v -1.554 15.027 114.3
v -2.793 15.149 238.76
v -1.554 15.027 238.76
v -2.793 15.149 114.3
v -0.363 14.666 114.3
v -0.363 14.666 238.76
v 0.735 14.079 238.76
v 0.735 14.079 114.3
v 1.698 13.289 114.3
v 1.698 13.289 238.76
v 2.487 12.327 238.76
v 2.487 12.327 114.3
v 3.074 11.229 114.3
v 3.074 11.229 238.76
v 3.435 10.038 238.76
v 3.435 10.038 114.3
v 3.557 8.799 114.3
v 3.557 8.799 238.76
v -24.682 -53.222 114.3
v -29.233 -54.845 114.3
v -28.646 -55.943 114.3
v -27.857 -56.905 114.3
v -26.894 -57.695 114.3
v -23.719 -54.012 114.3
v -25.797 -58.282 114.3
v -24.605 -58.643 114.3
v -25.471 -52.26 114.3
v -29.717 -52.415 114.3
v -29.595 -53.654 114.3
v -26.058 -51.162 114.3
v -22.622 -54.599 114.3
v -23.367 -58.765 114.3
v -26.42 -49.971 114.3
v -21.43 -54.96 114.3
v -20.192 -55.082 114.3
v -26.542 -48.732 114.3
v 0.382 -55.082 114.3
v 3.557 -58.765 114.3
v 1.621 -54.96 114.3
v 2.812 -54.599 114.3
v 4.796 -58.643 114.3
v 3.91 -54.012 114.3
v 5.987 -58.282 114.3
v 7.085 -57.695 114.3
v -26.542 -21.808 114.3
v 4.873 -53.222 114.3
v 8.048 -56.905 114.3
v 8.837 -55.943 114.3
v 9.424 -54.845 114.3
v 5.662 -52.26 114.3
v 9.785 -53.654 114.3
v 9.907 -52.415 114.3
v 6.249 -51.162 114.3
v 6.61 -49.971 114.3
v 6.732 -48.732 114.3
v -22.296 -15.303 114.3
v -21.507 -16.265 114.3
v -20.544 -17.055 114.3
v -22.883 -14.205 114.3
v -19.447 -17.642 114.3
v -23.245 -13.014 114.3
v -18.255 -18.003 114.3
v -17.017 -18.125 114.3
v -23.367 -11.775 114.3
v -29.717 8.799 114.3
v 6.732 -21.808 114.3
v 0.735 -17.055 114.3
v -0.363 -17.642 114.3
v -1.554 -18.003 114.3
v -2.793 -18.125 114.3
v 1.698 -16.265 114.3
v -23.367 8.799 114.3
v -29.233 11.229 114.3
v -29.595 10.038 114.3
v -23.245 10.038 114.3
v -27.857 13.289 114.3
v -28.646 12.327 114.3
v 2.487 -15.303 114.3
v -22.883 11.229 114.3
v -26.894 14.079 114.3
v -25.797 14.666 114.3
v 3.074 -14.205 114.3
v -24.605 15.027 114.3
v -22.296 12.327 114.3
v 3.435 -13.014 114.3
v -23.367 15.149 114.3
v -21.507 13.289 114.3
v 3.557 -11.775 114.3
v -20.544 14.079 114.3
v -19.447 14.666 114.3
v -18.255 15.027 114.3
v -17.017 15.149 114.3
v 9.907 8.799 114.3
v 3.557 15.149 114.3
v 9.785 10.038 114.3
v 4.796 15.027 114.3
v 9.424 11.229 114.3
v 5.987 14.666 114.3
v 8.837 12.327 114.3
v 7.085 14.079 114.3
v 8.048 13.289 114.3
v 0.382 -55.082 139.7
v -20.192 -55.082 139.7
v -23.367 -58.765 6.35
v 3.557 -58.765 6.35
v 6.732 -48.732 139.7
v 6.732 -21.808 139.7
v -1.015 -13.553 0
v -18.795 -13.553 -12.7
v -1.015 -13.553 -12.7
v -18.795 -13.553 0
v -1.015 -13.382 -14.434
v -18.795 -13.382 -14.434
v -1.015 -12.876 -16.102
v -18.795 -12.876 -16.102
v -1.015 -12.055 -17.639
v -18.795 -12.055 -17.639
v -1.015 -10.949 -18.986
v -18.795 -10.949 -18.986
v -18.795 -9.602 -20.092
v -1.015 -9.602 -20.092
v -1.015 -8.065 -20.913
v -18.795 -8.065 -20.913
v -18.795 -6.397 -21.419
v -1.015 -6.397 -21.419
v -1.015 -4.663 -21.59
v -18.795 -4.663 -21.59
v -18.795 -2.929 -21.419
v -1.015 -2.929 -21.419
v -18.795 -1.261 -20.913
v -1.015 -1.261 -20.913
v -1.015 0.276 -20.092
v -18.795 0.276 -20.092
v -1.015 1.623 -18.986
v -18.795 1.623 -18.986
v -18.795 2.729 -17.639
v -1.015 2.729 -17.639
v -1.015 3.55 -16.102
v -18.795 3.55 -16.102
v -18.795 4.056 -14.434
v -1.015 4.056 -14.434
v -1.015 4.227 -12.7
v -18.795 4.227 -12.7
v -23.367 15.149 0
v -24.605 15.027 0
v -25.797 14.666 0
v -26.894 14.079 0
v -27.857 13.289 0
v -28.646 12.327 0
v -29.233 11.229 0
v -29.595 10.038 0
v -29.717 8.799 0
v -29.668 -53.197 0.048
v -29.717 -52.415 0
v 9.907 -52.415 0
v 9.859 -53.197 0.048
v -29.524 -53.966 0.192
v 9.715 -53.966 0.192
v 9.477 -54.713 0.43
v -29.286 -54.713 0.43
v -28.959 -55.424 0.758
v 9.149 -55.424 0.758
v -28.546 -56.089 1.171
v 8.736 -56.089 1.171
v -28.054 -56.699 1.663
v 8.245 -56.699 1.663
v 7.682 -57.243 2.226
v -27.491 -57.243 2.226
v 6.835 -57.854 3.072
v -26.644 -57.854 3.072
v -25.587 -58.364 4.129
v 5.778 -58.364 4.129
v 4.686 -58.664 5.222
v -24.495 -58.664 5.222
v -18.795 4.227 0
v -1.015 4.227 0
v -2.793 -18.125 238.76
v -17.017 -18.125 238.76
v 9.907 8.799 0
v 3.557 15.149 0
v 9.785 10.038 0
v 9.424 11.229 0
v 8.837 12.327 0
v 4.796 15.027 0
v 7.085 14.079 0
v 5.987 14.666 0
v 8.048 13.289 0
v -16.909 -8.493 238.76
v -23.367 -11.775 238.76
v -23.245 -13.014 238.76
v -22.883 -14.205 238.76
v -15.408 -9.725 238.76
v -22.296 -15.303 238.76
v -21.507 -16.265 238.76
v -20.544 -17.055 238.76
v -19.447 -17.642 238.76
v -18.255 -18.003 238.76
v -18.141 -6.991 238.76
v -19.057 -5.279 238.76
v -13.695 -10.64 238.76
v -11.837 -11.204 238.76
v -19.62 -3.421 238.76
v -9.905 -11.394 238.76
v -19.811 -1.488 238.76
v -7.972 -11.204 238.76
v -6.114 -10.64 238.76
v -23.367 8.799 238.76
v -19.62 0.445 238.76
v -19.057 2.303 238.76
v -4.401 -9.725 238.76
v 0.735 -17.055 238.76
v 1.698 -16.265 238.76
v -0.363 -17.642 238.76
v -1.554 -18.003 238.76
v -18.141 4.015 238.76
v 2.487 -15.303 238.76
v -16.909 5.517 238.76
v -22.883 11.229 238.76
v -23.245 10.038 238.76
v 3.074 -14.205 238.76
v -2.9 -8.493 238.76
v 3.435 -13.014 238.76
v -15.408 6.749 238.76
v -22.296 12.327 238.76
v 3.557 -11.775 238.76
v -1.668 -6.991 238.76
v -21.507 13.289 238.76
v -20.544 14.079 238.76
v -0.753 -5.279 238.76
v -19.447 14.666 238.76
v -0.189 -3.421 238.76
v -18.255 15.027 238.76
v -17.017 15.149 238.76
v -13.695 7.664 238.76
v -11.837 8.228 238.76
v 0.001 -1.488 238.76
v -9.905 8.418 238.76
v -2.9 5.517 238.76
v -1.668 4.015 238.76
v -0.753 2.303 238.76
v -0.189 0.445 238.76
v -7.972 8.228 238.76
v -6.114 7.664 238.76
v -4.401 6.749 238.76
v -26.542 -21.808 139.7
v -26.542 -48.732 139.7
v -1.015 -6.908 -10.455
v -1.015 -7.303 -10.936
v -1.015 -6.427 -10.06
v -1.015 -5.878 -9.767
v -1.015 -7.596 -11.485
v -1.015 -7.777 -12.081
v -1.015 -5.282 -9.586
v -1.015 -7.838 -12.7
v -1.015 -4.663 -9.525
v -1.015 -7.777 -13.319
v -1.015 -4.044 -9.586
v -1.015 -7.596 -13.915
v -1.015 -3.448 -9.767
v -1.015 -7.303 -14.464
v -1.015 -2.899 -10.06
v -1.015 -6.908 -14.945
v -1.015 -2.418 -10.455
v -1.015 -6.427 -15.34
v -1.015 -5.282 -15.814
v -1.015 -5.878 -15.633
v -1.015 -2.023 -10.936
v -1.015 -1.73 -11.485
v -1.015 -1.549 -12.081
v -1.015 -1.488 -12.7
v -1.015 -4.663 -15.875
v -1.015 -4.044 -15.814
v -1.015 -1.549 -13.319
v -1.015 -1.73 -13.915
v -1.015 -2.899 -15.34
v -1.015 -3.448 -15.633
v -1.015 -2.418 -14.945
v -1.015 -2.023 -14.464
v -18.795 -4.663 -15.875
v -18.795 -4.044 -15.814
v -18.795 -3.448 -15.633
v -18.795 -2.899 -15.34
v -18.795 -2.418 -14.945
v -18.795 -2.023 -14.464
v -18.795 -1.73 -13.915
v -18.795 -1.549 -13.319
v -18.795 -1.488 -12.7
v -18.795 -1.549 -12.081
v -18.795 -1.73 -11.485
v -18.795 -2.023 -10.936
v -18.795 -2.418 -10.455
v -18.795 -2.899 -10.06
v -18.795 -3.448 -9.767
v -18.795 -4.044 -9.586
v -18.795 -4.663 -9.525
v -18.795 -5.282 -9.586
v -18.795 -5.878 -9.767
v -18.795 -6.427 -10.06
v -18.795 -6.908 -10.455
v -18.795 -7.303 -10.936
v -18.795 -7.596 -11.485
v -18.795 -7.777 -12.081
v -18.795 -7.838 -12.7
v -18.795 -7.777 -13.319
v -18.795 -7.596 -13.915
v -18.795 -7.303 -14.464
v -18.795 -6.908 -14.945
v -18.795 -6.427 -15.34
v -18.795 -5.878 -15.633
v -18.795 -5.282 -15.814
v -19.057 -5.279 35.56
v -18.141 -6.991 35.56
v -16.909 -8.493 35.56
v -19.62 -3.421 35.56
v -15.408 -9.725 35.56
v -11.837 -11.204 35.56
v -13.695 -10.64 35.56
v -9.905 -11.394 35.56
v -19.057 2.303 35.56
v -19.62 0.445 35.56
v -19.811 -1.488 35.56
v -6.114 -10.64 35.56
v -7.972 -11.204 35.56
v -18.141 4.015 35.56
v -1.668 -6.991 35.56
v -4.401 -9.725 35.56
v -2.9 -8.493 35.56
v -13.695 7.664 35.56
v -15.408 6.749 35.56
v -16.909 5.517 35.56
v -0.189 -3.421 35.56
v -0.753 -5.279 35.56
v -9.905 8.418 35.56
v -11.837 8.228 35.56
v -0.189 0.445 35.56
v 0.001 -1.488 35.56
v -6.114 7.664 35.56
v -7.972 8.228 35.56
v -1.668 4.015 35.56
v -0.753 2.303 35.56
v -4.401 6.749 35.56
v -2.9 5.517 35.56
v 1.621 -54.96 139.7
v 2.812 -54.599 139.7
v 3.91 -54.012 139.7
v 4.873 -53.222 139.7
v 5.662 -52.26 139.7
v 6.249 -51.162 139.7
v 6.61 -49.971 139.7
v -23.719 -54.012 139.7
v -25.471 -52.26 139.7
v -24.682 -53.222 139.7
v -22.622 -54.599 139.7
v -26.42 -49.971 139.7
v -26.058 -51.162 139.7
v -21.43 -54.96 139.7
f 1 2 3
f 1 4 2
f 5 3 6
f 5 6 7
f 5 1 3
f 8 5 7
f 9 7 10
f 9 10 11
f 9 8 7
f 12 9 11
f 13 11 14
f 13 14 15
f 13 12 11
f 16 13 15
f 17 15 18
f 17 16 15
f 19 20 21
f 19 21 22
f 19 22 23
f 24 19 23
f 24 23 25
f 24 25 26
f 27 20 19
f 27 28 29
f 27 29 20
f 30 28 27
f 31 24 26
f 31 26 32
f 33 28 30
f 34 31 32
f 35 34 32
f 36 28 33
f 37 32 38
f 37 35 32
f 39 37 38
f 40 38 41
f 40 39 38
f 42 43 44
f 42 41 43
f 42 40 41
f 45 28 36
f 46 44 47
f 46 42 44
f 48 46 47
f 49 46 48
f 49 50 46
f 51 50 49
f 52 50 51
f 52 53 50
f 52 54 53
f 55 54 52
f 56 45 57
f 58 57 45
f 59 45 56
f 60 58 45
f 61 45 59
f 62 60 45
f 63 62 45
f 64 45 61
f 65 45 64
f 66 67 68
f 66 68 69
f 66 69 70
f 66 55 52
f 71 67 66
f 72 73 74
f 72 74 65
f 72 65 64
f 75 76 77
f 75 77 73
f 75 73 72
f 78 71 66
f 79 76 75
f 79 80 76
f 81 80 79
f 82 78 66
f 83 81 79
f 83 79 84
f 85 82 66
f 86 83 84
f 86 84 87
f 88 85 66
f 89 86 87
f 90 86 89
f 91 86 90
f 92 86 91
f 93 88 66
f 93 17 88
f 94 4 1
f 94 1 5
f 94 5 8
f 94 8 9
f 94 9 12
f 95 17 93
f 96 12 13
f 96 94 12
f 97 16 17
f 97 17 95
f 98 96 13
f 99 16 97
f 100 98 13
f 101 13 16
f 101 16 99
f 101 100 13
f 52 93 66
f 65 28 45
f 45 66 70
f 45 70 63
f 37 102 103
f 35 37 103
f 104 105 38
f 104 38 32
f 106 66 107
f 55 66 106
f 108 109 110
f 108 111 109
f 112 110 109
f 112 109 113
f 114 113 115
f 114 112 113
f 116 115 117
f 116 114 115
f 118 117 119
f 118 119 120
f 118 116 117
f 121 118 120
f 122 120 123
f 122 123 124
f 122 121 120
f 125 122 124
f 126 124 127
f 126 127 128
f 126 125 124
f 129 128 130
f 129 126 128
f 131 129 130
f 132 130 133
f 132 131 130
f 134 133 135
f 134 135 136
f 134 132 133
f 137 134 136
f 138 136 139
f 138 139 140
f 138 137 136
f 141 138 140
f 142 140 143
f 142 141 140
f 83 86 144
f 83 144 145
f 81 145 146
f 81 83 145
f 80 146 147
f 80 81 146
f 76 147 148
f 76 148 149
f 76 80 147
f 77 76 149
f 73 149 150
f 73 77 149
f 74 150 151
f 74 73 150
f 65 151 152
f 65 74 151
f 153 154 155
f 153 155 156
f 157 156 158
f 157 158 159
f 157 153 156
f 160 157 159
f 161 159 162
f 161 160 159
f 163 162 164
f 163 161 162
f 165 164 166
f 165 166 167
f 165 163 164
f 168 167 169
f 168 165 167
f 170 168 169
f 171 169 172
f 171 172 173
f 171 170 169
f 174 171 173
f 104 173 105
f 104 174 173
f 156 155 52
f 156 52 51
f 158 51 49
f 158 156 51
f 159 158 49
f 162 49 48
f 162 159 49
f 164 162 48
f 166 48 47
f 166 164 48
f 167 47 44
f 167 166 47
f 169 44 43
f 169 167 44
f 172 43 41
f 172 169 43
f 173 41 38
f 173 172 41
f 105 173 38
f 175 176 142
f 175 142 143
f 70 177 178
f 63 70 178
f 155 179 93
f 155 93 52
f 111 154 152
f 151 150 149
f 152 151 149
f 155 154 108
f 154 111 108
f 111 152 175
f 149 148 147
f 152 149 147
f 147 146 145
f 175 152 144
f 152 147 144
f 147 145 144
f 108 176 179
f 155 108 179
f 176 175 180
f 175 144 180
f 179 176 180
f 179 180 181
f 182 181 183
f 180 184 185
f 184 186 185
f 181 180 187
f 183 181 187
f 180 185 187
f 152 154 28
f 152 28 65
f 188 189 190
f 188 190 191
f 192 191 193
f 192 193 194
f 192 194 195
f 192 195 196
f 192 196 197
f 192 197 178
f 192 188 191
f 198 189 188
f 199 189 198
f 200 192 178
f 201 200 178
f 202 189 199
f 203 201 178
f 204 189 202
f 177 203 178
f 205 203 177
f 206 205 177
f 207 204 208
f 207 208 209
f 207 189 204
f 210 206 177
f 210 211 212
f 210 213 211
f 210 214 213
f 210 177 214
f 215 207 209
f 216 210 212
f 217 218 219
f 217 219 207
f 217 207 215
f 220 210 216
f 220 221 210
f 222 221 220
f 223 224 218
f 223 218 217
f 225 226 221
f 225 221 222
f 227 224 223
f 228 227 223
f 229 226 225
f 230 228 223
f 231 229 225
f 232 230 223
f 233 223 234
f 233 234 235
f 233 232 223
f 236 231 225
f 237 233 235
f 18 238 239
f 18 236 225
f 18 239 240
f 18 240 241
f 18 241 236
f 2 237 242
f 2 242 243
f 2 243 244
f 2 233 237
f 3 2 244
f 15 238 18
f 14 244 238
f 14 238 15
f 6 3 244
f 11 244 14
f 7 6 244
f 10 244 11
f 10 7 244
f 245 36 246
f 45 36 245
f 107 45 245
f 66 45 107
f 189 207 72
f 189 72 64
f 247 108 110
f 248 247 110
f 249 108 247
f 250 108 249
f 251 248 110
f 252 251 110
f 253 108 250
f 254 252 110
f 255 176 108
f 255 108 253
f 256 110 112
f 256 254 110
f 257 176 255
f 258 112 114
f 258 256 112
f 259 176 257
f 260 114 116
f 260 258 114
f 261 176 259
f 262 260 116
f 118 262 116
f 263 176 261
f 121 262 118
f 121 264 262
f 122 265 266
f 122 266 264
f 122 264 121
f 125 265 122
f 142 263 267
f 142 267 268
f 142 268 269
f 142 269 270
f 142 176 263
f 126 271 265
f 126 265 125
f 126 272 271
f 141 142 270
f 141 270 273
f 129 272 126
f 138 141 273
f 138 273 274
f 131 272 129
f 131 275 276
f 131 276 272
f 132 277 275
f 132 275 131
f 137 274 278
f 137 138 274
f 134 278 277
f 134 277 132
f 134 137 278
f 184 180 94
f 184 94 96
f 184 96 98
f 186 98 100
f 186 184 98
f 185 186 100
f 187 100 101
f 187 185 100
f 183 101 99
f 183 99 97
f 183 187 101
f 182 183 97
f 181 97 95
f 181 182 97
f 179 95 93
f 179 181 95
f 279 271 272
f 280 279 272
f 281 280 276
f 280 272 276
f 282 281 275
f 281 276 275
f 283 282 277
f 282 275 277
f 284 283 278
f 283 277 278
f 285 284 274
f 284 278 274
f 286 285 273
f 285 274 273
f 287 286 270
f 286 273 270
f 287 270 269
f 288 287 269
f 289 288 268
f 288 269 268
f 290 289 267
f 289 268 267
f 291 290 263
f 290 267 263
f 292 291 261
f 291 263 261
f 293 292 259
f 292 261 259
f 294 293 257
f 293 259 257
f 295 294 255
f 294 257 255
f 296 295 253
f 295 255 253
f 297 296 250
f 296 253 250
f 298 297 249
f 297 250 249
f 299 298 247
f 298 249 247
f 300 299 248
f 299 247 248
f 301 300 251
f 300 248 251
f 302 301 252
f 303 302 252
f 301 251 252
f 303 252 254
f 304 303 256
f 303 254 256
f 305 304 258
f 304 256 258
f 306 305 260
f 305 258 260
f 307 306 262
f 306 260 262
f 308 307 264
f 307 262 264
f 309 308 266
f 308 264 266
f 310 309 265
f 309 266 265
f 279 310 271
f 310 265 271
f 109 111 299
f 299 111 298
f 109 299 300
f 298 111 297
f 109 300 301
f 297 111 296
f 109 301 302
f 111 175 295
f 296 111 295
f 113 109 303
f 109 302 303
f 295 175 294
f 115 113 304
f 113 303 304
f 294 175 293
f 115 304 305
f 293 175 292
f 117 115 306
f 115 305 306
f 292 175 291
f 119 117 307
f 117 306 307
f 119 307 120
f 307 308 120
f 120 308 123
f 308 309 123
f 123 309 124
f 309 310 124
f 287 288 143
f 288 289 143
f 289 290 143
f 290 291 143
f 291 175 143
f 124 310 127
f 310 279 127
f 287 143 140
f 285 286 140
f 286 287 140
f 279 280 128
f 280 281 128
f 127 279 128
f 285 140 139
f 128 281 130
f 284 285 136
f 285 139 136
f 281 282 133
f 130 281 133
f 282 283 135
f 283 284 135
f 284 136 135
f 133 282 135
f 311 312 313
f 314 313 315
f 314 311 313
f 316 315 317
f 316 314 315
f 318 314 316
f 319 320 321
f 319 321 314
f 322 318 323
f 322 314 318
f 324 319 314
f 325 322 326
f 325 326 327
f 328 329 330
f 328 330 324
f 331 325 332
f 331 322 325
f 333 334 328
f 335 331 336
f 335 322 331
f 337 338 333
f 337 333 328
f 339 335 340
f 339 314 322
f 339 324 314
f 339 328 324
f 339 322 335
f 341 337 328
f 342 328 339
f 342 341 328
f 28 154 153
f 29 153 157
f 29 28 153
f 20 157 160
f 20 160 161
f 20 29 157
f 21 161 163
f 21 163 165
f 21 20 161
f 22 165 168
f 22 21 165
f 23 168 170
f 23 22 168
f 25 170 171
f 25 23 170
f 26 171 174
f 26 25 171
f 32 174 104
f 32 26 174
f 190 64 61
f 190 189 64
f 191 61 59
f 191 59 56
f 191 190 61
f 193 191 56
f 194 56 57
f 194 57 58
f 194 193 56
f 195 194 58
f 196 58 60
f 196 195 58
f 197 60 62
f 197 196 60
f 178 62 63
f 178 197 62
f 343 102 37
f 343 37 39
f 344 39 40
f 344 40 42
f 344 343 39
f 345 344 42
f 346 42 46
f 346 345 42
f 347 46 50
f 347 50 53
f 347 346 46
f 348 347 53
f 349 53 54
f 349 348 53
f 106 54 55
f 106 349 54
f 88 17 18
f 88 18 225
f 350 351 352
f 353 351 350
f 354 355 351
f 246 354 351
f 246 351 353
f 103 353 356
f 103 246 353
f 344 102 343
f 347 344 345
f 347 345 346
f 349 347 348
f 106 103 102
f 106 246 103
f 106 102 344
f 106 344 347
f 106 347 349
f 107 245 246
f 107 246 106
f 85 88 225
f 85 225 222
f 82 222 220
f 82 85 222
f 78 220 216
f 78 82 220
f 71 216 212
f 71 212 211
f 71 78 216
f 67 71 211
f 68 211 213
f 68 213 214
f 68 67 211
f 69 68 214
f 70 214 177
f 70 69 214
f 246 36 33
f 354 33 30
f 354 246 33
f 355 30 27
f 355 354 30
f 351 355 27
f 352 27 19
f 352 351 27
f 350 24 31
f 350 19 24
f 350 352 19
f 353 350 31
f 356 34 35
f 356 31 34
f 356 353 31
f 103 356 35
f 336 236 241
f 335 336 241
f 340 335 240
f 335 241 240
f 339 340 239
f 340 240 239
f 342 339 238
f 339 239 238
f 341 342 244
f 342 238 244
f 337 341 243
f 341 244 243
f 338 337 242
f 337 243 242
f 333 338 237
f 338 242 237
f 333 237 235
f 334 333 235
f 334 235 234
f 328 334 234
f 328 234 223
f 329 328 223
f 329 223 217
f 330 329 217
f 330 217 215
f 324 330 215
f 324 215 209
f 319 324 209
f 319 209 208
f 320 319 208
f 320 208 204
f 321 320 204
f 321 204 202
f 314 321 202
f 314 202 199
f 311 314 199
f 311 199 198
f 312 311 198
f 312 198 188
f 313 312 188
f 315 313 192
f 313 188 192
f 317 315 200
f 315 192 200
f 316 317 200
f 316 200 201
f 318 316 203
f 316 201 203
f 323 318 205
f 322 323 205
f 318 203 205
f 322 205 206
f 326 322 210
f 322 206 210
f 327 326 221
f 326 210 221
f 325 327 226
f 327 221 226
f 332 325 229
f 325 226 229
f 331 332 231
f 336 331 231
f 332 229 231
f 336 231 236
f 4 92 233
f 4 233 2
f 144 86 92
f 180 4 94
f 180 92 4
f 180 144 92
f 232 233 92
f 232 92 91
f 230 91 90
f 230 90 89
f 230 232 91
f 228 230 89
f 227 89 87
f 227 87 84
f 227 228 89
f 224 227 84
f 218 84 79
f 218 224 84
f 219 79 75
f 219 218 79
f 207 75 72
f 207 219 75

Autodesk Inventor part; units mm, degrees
ref_plane "YZ Plane" through (0, 0, 0) normal (1, 0, 0) x (0, 1, 0)
ref_plane "XZ Plane" through (0, 0, 0) normal (0, 1, 0) x (-1, 0, 0)
ref_plane "XY Plane" through (0, 0, 0) normal (0, 0, 1) x (1, 0, 0)
sketch "Sketch1" plane through (0, 0, 0) normal (0, 0, 1) x (1, 0, 0)
  line L0 (-29.7166, 15.149) -> (9.9074, 15.149)
  line L1 (9.9074, 15.149) -> (9.9074, -58.765)
  line L2 (9.9074, -58.765) -> (-29.7166, -58.765)
  line L3 (-29.7166, -58.765) -> (-29.7166, 15.149)
  point P0 (0, 0)
  dimension "d0" = 39.624
  dimension "d1" = 73.914
extrude "Extrusion1" add sketch "Sketch1" along normal blind 76.2
sketch "Sketch2" plane through (0, 0, 76.2) normal (0, 0, 1) x (1, 0, 0)
  line L0 (9.9074, 15.149) -> (9.9074, -58.765) projected
  line L1 (-29.7166, 15.149) -> (9.9074, 15.149)
  line L2 (9.9074, 15.149) -> (9.9074, -24.475)
  line L3 (9.9074, -24.475) -> (-29.7166, -24.475)
  line L4 (-29.7166, -24.475) -> (-29.7166, 15.149)
  line L5 (-29.7166, -24.475) -> (-23.3666, -24.475)
  line L6 (-23.3666, -24.475) -> (-23.3666, -18.125)
  line L7 (-23.3666, -18.125) -> (-29.7166, -18.125)
  line L8 (-29.7166, -18.125) -> (-29.7166, -24.475)
  line L9 (-23.3666, -18.125) -> (3.5574, -18.125)
  line L10 (3.5574, -18.125) -> (3.5574, 15.149)
  line L11 (3.5574, 15.149) -> (-23.3666, 15.149)
  line L12 (-23.3666, 15.149) -> (-23.3666, -18.125)
  point P0 (0, 0)
  dimension "d4" = 39.624
  dimension "d5" = 6.35
  dimension "d6" = 6.35
  dimension "d7" = 26.924
extrude "Extrusion2" add sketch "Sketch2" along normal blind 162.56 contours L10 L9 L12 L1
sketch "Sketch3" plane through (0, 0, 238.76) normal (0, 0, 1) x (1, 0, 0)
  line L0 (-23.3666, 15.149) -> (3.5574, -18.125)
  line L1 (3.5574, 15.149) -> (-23.3666, -18.125)
  circle A0 centre (-9.9046, -1.488) radius 9.906
  point P0 (0, 0)
  dimension "d10" = 19.812
extrude "Extrusion3" cut sketch "Sketch3" against normal blind 203.2
sketch "Sketch4" plane through (0, 0, 76.2) normal (0, 0, 1) x (1, 0, 0)
  line L0 (3.5574, 15.149) -> (3.5574, -18.125) projected
  line L1 (3.5574, -18.125) -> (-23.3666, -18.125) projected
  line L2 (-23.3666, -18.125) -> (-23.3666, 15.149) projected
  line L3 (-29.7166, 15.149) -> (-23.3666, 15.149) projected
  line L4 (-29.7166, -58.765) -> (-29.7166, 15.149) projected
  line L5 (9.9074, -58.765) -> (-29.7166, -58.765) projected
  line L6 (9.9074, 15.149) -> (9.9074, -58.765) projected
  line L7 (3.5574, 15.149) -> (9.9074, 15.149) projected
  point P0 (0, 0)
extrude "Extrusion4" cut sketch "Sketch4" against normal blind 25.4
sketch "Sketch5" plane through (0, 0, 50.8) normal (0, 0, 1) x (1, 0, 0)
  line L0 (-26.5416, -21.808) -> (6.7324, -21.808)
  line L1 (6.7324, -21.808) -> (6.7324, -55.082)
  line L2 (6.7324, -55.082) -> (-26.5416, -55.082)
  line L3 (-26.5416, -55.082) -> (-26.5416, -21.808)
  point P0 (0, 0)
  dimension "d15" = 33.274
extrude "Extrusion5" add sketch "Sketch5" along normal blind 88.9
sketch "Sketch6" plane through (0, 0, 50.8) normal (0, 0, 1) x (1, 0, 0)
  line L0 (6.7324, -21.808) -> (6.7324, -55.082) projected
  line L1 (6.7324, -55.082) -> (-26.5416, -55.082) projected
  line L2 (-26.5416, -55.082) -> (-26.5416, -21.808) projected
  line L3 (-26.5416, -21.808) -> (6.7324, -21.808) projected
  line L4 (3.5574, -18.125) -> (-23.3666, -18.125) projected
  line L5 (-23.3666, -18.125) -> (-23.3666, 15.149) projected
  line L6 (-29.7166, 15.149) -> (-23.3666, 15.149) projected
  line L7 (-29.7166, -58.765) -> (-29.7166, 15.149) projected
  line L8 (9.9074, -58.765) -> (-29.7166, -58.765) projected
  line L9 (9.9074, 15.149) -> (9.9074, -58.765) projected
  line L10 (3.5574, 15.149) -> (9.9074, 15.149) projected
  line L11 (3.5574, 15.149) -> (3.5574, -18.125) projected
  point P0 (0, 0)
extrude "Extrusion6" add sketch "Sketch6" along normal blind 25.4
sketch "Sketch7" plane through (0, 0, 0) normal (0, 0, -1) x (-1, 0, 0)
  line L0 (-9.9074, 15.149) -> (-9.9074, -58.765) projected
  line L1 (29.7166, -58.765) -> (29.7166, 15.149) projected
  line L2 (-9.9074, 15.149) -> (29.7166, -24.475)
  line L3 (-9.9074, 15.149) -> (46.1294, 15.149) construction
  line L4 (29.7166, 15.149) -> (-9.9074, -24.475)
  line L5 (1.0146, 4.227) -> (18.7946, 4.227)
  line L6 (1.0146, 4.227) -> (18.7946, 4.227)
  line L7 (18.7946, 4.227) -> (18.7946, -13.553)
  line L8 (18.7946, -13.553) -> (1.0146, -13.553)
  line L9 (1.0146, -13.553) -> (1.0146, 4.227)
  point P0 (0, 0)
  dimension "d20" = 45
  dimension "d21" = 17.78
extrude "Extrusion7" add sketch "Sketch7" along normal blind 12.7 contours L5 L4 L2 | L2 L4 L9 | L4 L2 L8 | L4 L7 L2
sketch "Sketch8" plane through (-18.7946, -13.553, 0) normal (-1, 0, 0) x (0, 0, 1)
  line L0 (-12.7, 17.78) -> (-12.7, 0) projected
  circle A0 centre (-12.7, 8.89) radius 3.175
  point P0 (0, 13.553)
  dimension "d24" = 6.35
extrude "Extrusion8" cut sketch "Sketch8" against normal blind 25.4
sketch "Sketch9" plane through (-1.0146, -13.553, 0) normal (1, 0, 0) x (0, 0, -1)
  arc A0 (12.7, 12.065) -> (12.7, 5.715) centre (12.7, 8.89) ccw projected
  circle A1 centre (12.7, 8.89) radius 3.175
  circle A2 centre (12.7, 8.89) radius 8.89
  point P0 (0, 13.553)
extrude "Extrusion9" add sketch "Sketch9" against normal blind 17.78
sketch "Sketch10" plane through (0, 0, 76.2) normal (0, 0, 1) x (1, 0, 0)
  line L0 (-26.5416, -55.082) -> (6.7324, -55.082) projected
  line L1 (-26.5416, -21.808) -> (-26.5416, -55.082) projected
  line L2 (6.7324, -21.808) -> (-26.5416, -21.808) projected
  line L3 (6.7324, -55.082) -> (6.7324, -21.808) projected
  line L4 (3.5574, -18.125) -> (3.5574, 15.149) projected
  line L5 (-23.3666, -18.125) -> (3.5574, -18.125) projected
  line L6 (-23.3666, 15.149) -> (-23.3666, -18.125) projected
  line L7 (-29.7166, 15.149) -> (-23.3666, 15.149) projected
  line L8 (-29.7166, -58.765) -> (-29.7166, 15.149) projected
  line L9 (9.9074, -58.765) -> (-29.7166, -58.765) projected
  line L10 (9.9074, 15.149) -> (9.9074, -58.765) projected
  line L11 (3.5574, 15.149) -> (9.9074, 15.149) projected
  point P0 (0, 0)
extrude "Extrusion10" add sketch "Sketch10" along normal blind 38.1
fillet "Fillet1" radius 6.35 11 edges at (9.9074, 15.149, 57.15) (-29.7166, 15.149, 57.15) (9.9074, -58.765, 57.15) (-29.7166, -58.765, 57.15) (-26.5416, -55.082, 127) (6.7324, -55.082, 127) (-9.9046, -58.765, 0) (-23.3666, 15.149, 176.53) (3.5574, 15.149, 176.53) (-23.3666, -18.125, 176.53) (3.5574, -18.125, 176.53)
properties part number "linac body"
